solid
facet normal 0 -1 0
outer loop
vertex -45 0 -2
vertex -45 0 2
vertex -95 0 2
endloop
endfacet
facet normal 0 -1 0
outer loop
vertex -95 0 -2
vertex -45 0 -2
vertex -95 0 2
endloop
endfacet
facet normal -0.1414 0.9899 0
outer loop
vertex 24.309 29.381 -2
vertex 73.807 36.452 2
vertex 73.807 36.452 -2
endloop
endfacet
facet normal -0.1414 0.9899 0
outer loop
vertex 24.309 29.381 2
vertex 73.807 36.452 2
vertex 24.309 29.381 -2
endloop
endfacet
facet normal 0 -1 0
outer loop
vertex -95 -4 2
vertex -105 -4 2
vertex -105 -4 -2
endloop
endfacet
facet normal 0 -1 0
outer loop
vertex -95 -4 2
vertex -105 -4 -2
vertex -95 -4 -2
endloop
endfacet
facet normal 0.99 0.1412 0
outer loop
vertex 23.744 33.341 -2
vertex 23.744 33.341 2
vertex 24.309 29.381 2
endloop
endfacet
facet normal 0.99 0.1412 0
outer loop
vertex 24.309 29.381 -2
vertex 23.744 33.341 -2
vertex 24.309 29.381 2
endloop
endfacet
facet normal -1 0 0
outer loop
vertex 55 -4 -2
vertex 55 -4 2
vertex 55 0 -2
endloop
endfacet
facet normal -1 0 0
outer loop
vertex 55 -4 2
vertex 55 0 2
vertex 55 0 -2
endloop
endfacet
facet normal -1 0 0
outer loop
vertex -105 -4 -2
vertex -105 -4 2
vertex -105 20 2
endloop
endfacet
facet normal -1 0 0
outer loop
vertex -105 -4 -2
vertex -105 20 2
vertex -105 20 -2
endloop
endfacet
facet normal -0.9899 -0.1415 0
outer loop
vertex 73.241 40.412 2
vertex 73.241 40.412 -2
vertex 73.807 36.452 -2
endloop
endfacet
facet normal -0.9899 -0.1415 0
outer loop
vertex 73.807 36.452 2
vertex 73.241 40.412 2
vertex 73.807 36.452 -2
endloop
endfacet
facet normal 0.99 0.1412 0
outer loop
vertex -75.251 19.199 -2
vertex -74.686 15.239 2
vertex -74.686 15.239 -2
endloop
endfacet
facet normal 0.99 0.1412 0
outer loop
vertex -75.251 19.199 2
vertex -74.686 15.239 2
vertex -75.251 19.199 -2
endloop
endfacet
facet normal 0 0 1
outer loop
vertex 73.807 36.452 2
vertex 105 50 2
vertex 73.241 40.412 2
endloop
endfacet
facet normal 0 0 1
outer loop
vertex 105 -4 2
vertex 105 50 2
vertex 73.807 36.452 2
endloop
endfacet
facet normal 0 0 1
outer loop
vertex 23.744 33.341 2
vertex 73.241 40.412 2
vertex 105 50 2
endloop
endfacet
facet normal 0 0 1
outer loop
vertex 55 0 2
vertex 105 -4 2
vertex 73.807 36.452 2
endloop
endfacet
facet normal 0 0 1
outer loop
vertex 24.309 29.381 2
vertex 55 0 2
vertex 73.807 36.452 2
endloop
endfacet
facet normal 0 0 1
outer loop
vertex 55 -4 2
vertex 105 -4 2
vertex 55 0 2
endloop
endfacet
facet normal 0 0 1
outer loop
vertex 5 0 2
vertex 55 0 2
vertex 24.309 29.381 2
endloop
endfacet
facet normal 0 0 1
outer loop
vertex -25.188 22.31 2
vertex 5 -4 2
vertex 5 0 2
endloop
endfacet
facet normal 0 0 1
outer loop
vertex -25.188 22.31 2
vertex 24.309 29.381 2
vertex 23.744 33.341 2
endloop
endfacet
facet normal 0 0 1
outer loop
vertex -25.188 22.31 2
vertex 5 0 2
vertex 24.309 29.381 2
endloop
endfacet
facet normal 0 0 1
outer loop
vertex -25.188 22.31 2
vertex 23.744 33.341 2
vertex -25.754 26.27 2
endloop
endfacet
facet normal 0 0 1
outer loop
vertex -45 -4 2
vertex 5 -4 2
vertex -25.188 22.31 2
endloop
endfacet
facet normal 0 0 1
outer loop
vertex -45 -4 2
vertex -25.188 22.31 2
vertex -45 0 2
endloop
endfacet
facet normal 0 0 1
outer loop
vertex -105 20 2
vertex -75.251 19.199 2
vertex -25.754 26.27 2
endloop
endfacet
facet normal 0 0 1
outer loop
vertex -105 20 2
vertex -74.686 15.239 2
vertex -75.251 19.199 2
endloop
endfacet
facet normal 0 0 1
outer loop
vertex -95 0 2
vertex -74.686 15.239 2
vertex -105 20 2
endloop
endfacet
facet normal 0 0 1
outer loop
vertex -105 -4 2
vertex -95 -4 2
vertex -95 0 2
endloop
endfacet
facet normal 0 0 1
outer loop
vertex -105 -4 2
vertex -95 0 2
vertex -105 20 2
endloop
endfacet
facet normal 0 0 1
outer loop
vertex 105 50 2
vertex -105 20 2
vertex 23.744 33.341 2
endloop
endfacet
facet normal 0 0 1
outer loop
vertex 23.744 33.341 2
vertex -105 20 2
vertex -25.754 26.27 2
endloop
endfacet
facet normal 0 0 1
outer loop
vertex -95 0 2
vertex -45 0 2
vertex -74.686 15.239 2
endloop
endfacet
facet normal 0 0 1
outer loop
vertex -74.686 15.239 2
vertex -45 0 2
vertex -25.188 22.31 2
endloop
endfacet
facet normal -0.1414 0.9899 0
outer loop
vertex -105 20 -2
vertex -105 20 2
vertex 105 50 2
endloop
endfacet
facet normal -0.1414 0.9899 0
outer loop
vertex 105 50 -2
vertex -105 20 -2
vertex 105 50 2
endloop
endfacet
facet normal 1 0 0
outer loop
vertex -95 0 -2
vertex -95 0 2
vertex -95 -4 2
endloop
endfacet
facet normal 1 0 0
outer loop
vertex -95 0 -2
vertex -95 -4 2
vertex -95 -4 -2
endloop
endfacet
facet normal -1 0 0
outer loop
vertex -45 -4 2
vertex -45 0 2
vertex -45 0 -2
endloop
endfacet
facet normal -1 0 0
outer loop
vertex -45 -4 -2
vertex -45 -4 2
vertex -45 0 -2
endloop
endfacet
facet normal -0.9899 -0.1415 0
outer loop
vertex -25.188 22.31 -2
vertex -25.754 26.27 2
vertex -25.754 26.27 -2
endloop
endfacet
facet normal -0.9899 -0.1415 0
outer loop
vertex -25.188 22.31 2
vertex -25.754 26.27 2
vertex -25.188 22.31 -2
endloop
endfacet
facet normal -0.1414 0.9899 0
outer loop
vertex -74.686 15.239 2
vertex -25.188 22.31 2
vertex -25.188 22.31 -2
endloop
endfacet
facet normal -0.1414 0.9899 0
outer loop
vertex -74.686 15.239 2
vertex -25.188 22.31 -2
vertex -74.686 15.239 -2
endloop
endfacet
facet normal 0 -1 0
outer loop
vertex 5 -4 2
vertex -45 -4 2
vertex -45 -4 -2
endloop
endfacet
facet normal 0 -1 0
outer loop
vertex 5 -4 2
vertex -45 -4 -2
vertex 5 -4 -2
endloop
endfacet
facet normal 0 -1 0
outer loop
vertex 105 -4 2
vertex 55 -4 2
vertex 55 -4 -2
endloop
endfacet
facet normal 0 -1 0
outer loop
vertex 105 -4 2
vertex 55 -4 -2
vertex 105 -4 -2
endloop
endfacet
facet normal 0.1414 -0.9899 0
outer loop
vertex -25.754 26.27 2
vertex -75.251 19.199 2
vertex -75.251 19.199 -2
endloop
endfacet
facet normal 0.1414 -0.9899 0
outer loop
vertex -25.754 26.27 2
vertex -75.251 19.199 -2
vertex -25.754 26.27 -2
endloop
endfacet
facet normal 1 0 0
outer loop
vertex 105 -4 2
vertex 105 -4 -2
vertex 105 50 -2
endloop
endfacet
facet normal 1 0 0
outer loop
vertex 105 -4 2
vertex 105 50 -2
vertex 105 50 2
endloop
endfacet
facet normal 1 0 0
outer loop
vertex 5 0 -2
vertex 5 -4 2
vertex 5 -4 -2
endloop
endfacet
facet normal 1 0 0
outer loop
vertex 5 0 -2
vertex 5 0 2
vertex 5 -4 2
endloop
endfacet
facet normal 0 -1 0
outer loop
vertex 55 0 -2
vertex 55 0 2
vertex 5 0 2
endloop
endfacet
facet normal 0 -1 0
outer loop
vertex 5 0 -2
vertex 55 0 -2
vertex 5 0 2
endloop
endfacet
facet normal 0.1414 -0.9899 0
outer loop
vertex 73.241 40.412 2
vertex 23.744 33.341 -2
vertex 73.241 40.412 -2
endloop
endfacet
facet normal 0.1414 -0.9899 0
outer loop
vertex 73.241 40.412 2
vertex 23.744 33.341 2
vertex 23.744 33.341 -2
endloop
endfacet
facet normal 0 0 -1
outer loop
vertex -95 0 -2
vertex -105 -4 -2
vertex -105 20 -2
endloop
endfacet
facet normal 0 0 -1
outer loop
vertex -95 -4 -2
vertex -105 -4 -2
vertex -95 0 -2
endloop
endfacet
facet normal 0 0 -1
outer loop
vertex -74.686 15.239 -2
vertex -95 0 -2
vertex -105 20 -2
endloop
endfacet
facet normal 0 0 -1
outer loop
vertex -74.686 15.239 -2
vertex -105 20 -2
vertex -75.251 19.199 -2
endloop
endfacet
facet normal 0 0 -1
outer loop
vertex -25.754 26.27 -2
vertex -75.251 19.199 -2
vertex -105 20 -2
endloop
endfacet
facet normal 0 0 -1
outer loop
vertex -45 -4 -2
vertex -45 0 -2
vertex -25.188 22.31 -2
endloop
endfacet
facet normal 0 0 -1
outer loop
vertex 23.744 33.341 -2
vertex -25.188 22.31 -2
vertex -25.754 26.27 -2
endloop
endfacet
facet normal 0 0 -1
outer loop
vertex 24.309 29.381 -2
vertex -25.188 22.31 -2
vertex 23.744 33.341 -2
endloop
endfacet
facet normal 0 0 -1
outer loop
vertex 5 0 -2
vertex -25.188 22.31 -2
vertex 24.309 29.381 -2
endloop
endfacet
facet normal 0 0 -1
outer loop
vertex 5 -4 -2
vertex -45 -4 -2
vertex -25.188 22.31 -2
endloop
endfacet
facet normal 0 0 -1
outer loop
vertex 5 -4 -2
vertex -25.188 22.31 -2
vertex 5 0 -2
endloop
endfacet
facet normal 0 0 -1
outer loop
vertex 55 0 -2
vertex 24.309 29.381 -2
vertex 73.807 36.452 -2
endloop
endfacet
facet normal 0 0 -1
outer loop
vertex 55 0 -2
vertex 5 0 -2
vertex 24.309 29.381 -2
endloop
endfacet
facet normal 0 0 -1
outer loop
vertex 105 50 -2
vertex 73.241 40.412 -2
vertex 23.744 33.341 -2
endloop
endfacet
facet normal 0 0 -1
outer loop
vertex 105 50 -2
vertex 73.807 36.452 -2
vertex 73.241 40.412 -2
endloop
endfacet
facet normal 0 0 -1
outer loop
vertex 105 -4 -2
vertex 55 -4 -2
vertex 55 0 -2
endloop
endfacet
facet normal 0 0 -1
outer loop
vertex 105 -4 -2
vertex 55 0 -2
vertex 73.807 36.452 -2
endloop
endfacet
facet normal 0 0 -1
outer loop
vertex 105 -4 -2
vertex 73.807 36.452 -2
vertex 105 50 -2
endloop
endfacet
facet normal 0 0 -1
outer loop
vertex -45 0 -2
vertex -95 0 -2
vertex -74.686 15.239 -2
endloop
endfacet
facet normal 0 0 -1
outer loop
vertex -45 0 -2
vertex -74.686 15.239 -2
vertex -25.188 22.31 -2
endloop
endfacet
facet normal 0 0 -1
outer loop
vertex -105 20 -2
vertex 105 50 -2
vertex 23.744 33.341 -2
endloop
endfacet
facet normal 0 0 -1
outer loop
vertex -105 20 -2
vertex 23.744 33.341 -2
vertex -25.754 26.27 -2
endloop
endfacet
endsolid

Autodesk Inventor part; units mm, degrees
ref_plane "YZ Plane" through (0, 0, 0) normal (1, 0, 0) x (0, 1, 0)
ref_plane "XZ Plane" through (0, 0, 0) normal (0, 1, 0) x (-1, 0, 0)
ref_plane "XY Plane" through (0, 0, 0) normal (0, 0, 1) x (1, 0, 0)
sketch "Sketch2" plane through (0, 0, 0) normal (0, 1, 0) x (-1, 0, 0)
  line L0 (105, -2) -> (-105, -2)
  line L1 (-105, -2) -> (-105, 2)
  line L2 (-105, 2) -> (105, 2)
  line L3 (105, 2) -> (105, -2)
  line L4 (105, -2) -> (-105, 2) construction
  line L5 (-105, -2) -> (105, 2) construction
  point P0 (0, 0)
  dimension "d1" = 210
  dimension "d2" = 4
extrude "Extrusion1" add sketch "Sketch2" along normal blind 100
sketch "Sketch3" plane through (-105, 0, 2) normal (0, 0, 1) x (1, 0, 0)
  line L0 (0, 0) -> (0, 100) projected
  line L1 (0, 20) -> (210, 50)
  line L2 (210, 0) -> (210, 100) projected
  line L3 (0, 0) -> (210, 0) projected
  line L4 (0, 0) -> (210, 0) projected
  line L5 (210, 0) -> (210, 100) projected
  line L6 (0, 100) -> (210, 100) projected
  line L7 (0, 0) -> (0, 100) projected
  point P0 (105, 0)
  dimension "d5" = 20
  dimension "d37" = 30
extrude "Extrusion2" cut sketch "Sketch3" against normal up to next contours L0 L6 L2 L1
sketch "Sketch4" plane through (0, 0, 0) normal (0, -1, 0) x (1, 0, 0)
  line L0 (105, 2) -> (55, 2)
  line L1 (55, 2) -> (55, -2)
  line L2 (55, -2) -> (105, -2)
  line L3 (105, -2) -> (105, 2)
  line L4 (-105, 2) -> (105, 2) projected
  line L5 (-105, -2) -> (-105, 2) projected
  line L6 (105, -2) -> (-105, -2) projected
  line L7 (105, 2) -> (105, -2) projected
  line L8 (55, 2) -> (5, 2)
  line L9 (5, 2) -> (5, -2)
  line L10 (5, -2) -> (55, -2)
  line L11 (55, -2) -> (55, 2)
  line L12 (5, 2) -> (-45, 2)
  line L13 (-45, 2) -> (-45, -2)
  line L14 (-45, -2) -> (5, -2)
  line L15 (5, -2) -> (5, 2)
  line L16 (-45, 2) -> (-95, 2)
  line L17 (-95, 2) -> (-95, -2)
  line L18 (-95, -2) -> (-45, -2)
  line L19 (-45, -2) -> (-45, 2)
  point P0 (0, 0)
  point P1 (55, -2)
  point P2 (5, -2)
  point P3 (-45, -2)
  dimension "d9" = 50
  dimension "d10" = 4
  dimension "d13" = 50
extrude "Extrusion3" add sketch "Sketch4" along normal blind 4 contours L3 L2 L1 L0 | L9 L6 L13 L4 | L17 L6 L5 L4
sketch "Sketch5" plane through (-95, 0, 2) normal (0, 0, 1) x (1, 0, 0)
  line L0 (-10, 20) -> (-10, -4) projected
  line L1 (0, -4) -> (-10, -4) projected
  line L2 (0, 0) -> (0, -4) projected
  line L3 (0, 0) -> (50, 0) projected
  line L4 (50, 0) -> (50, -4) projected
  line L5 (100, -4) -> (50, -4) projected
  line L6 (100, 0) -> (100, -4) projected
  line L7 (100, 0) -> (150, 0) projected
  line L8 (150, 0) -> (150, -4) projected
  line L9 (200, -4) -> (150, -4) projected
  line L10 (200, -4) -> (200, 50) projected
  line L11 (200, 50) -> (-10, 20) projected
  line L12 (-5, 15.6635) -> (192.9899, 43.9478)
  line L13 (19.7487, 19.1991) -> (69.2462, 26.2701)
  line L14 (69.2462, 26.2701) -> (69.8119, 22.3103)
  line L15 (69.8119, 22.3103) -> (20.3144, 15.2393)
  line L16 (20.3144, 15.2393) -> (19.7487, 19.1991)
  line L17 (118.7437, 33.3412) -> (119.3094, 29.3814)
  line L18 (69.8119, 22.3103) -> (69.2462, 26.2701)
  line L19 (119.3094, 29.3814) -> (69.8119, 22.3103)
  line L20 (69.2462, 26.2701) -> (118.7437, 33.3412)
  line L21 (168.2412, 40.4123) -> (168.8068, 36.4525)
  line L22 (119.3094, 29.3814) -> (118.7437, 33.3412)
  line L23 (168.8068, 36.4525) -> (119.3094, 29.3814)
  line L24 (118.7437, 33.3412) -> (168.2412, 40.4123)
  line L25 (200, 50) -> (-10, 20) projected
  point P0 (95, 0)
  point P1 (200, 100)
  point P2 (168.2412, 40.4123)
  dimension "d20" = 200
  dimension "d24" = 4
  dimension "d25" = 50
  dimension "d26" = 5
  dimension "d27" = 25
  dimension "d30" = 50
extrude "Extrusion4" cut sketch "Sketch5" against normal up to next contours L12 L14 L15 L16 | L12 L21 L23 L17
properties part number "ControlPanelSide_V1"
